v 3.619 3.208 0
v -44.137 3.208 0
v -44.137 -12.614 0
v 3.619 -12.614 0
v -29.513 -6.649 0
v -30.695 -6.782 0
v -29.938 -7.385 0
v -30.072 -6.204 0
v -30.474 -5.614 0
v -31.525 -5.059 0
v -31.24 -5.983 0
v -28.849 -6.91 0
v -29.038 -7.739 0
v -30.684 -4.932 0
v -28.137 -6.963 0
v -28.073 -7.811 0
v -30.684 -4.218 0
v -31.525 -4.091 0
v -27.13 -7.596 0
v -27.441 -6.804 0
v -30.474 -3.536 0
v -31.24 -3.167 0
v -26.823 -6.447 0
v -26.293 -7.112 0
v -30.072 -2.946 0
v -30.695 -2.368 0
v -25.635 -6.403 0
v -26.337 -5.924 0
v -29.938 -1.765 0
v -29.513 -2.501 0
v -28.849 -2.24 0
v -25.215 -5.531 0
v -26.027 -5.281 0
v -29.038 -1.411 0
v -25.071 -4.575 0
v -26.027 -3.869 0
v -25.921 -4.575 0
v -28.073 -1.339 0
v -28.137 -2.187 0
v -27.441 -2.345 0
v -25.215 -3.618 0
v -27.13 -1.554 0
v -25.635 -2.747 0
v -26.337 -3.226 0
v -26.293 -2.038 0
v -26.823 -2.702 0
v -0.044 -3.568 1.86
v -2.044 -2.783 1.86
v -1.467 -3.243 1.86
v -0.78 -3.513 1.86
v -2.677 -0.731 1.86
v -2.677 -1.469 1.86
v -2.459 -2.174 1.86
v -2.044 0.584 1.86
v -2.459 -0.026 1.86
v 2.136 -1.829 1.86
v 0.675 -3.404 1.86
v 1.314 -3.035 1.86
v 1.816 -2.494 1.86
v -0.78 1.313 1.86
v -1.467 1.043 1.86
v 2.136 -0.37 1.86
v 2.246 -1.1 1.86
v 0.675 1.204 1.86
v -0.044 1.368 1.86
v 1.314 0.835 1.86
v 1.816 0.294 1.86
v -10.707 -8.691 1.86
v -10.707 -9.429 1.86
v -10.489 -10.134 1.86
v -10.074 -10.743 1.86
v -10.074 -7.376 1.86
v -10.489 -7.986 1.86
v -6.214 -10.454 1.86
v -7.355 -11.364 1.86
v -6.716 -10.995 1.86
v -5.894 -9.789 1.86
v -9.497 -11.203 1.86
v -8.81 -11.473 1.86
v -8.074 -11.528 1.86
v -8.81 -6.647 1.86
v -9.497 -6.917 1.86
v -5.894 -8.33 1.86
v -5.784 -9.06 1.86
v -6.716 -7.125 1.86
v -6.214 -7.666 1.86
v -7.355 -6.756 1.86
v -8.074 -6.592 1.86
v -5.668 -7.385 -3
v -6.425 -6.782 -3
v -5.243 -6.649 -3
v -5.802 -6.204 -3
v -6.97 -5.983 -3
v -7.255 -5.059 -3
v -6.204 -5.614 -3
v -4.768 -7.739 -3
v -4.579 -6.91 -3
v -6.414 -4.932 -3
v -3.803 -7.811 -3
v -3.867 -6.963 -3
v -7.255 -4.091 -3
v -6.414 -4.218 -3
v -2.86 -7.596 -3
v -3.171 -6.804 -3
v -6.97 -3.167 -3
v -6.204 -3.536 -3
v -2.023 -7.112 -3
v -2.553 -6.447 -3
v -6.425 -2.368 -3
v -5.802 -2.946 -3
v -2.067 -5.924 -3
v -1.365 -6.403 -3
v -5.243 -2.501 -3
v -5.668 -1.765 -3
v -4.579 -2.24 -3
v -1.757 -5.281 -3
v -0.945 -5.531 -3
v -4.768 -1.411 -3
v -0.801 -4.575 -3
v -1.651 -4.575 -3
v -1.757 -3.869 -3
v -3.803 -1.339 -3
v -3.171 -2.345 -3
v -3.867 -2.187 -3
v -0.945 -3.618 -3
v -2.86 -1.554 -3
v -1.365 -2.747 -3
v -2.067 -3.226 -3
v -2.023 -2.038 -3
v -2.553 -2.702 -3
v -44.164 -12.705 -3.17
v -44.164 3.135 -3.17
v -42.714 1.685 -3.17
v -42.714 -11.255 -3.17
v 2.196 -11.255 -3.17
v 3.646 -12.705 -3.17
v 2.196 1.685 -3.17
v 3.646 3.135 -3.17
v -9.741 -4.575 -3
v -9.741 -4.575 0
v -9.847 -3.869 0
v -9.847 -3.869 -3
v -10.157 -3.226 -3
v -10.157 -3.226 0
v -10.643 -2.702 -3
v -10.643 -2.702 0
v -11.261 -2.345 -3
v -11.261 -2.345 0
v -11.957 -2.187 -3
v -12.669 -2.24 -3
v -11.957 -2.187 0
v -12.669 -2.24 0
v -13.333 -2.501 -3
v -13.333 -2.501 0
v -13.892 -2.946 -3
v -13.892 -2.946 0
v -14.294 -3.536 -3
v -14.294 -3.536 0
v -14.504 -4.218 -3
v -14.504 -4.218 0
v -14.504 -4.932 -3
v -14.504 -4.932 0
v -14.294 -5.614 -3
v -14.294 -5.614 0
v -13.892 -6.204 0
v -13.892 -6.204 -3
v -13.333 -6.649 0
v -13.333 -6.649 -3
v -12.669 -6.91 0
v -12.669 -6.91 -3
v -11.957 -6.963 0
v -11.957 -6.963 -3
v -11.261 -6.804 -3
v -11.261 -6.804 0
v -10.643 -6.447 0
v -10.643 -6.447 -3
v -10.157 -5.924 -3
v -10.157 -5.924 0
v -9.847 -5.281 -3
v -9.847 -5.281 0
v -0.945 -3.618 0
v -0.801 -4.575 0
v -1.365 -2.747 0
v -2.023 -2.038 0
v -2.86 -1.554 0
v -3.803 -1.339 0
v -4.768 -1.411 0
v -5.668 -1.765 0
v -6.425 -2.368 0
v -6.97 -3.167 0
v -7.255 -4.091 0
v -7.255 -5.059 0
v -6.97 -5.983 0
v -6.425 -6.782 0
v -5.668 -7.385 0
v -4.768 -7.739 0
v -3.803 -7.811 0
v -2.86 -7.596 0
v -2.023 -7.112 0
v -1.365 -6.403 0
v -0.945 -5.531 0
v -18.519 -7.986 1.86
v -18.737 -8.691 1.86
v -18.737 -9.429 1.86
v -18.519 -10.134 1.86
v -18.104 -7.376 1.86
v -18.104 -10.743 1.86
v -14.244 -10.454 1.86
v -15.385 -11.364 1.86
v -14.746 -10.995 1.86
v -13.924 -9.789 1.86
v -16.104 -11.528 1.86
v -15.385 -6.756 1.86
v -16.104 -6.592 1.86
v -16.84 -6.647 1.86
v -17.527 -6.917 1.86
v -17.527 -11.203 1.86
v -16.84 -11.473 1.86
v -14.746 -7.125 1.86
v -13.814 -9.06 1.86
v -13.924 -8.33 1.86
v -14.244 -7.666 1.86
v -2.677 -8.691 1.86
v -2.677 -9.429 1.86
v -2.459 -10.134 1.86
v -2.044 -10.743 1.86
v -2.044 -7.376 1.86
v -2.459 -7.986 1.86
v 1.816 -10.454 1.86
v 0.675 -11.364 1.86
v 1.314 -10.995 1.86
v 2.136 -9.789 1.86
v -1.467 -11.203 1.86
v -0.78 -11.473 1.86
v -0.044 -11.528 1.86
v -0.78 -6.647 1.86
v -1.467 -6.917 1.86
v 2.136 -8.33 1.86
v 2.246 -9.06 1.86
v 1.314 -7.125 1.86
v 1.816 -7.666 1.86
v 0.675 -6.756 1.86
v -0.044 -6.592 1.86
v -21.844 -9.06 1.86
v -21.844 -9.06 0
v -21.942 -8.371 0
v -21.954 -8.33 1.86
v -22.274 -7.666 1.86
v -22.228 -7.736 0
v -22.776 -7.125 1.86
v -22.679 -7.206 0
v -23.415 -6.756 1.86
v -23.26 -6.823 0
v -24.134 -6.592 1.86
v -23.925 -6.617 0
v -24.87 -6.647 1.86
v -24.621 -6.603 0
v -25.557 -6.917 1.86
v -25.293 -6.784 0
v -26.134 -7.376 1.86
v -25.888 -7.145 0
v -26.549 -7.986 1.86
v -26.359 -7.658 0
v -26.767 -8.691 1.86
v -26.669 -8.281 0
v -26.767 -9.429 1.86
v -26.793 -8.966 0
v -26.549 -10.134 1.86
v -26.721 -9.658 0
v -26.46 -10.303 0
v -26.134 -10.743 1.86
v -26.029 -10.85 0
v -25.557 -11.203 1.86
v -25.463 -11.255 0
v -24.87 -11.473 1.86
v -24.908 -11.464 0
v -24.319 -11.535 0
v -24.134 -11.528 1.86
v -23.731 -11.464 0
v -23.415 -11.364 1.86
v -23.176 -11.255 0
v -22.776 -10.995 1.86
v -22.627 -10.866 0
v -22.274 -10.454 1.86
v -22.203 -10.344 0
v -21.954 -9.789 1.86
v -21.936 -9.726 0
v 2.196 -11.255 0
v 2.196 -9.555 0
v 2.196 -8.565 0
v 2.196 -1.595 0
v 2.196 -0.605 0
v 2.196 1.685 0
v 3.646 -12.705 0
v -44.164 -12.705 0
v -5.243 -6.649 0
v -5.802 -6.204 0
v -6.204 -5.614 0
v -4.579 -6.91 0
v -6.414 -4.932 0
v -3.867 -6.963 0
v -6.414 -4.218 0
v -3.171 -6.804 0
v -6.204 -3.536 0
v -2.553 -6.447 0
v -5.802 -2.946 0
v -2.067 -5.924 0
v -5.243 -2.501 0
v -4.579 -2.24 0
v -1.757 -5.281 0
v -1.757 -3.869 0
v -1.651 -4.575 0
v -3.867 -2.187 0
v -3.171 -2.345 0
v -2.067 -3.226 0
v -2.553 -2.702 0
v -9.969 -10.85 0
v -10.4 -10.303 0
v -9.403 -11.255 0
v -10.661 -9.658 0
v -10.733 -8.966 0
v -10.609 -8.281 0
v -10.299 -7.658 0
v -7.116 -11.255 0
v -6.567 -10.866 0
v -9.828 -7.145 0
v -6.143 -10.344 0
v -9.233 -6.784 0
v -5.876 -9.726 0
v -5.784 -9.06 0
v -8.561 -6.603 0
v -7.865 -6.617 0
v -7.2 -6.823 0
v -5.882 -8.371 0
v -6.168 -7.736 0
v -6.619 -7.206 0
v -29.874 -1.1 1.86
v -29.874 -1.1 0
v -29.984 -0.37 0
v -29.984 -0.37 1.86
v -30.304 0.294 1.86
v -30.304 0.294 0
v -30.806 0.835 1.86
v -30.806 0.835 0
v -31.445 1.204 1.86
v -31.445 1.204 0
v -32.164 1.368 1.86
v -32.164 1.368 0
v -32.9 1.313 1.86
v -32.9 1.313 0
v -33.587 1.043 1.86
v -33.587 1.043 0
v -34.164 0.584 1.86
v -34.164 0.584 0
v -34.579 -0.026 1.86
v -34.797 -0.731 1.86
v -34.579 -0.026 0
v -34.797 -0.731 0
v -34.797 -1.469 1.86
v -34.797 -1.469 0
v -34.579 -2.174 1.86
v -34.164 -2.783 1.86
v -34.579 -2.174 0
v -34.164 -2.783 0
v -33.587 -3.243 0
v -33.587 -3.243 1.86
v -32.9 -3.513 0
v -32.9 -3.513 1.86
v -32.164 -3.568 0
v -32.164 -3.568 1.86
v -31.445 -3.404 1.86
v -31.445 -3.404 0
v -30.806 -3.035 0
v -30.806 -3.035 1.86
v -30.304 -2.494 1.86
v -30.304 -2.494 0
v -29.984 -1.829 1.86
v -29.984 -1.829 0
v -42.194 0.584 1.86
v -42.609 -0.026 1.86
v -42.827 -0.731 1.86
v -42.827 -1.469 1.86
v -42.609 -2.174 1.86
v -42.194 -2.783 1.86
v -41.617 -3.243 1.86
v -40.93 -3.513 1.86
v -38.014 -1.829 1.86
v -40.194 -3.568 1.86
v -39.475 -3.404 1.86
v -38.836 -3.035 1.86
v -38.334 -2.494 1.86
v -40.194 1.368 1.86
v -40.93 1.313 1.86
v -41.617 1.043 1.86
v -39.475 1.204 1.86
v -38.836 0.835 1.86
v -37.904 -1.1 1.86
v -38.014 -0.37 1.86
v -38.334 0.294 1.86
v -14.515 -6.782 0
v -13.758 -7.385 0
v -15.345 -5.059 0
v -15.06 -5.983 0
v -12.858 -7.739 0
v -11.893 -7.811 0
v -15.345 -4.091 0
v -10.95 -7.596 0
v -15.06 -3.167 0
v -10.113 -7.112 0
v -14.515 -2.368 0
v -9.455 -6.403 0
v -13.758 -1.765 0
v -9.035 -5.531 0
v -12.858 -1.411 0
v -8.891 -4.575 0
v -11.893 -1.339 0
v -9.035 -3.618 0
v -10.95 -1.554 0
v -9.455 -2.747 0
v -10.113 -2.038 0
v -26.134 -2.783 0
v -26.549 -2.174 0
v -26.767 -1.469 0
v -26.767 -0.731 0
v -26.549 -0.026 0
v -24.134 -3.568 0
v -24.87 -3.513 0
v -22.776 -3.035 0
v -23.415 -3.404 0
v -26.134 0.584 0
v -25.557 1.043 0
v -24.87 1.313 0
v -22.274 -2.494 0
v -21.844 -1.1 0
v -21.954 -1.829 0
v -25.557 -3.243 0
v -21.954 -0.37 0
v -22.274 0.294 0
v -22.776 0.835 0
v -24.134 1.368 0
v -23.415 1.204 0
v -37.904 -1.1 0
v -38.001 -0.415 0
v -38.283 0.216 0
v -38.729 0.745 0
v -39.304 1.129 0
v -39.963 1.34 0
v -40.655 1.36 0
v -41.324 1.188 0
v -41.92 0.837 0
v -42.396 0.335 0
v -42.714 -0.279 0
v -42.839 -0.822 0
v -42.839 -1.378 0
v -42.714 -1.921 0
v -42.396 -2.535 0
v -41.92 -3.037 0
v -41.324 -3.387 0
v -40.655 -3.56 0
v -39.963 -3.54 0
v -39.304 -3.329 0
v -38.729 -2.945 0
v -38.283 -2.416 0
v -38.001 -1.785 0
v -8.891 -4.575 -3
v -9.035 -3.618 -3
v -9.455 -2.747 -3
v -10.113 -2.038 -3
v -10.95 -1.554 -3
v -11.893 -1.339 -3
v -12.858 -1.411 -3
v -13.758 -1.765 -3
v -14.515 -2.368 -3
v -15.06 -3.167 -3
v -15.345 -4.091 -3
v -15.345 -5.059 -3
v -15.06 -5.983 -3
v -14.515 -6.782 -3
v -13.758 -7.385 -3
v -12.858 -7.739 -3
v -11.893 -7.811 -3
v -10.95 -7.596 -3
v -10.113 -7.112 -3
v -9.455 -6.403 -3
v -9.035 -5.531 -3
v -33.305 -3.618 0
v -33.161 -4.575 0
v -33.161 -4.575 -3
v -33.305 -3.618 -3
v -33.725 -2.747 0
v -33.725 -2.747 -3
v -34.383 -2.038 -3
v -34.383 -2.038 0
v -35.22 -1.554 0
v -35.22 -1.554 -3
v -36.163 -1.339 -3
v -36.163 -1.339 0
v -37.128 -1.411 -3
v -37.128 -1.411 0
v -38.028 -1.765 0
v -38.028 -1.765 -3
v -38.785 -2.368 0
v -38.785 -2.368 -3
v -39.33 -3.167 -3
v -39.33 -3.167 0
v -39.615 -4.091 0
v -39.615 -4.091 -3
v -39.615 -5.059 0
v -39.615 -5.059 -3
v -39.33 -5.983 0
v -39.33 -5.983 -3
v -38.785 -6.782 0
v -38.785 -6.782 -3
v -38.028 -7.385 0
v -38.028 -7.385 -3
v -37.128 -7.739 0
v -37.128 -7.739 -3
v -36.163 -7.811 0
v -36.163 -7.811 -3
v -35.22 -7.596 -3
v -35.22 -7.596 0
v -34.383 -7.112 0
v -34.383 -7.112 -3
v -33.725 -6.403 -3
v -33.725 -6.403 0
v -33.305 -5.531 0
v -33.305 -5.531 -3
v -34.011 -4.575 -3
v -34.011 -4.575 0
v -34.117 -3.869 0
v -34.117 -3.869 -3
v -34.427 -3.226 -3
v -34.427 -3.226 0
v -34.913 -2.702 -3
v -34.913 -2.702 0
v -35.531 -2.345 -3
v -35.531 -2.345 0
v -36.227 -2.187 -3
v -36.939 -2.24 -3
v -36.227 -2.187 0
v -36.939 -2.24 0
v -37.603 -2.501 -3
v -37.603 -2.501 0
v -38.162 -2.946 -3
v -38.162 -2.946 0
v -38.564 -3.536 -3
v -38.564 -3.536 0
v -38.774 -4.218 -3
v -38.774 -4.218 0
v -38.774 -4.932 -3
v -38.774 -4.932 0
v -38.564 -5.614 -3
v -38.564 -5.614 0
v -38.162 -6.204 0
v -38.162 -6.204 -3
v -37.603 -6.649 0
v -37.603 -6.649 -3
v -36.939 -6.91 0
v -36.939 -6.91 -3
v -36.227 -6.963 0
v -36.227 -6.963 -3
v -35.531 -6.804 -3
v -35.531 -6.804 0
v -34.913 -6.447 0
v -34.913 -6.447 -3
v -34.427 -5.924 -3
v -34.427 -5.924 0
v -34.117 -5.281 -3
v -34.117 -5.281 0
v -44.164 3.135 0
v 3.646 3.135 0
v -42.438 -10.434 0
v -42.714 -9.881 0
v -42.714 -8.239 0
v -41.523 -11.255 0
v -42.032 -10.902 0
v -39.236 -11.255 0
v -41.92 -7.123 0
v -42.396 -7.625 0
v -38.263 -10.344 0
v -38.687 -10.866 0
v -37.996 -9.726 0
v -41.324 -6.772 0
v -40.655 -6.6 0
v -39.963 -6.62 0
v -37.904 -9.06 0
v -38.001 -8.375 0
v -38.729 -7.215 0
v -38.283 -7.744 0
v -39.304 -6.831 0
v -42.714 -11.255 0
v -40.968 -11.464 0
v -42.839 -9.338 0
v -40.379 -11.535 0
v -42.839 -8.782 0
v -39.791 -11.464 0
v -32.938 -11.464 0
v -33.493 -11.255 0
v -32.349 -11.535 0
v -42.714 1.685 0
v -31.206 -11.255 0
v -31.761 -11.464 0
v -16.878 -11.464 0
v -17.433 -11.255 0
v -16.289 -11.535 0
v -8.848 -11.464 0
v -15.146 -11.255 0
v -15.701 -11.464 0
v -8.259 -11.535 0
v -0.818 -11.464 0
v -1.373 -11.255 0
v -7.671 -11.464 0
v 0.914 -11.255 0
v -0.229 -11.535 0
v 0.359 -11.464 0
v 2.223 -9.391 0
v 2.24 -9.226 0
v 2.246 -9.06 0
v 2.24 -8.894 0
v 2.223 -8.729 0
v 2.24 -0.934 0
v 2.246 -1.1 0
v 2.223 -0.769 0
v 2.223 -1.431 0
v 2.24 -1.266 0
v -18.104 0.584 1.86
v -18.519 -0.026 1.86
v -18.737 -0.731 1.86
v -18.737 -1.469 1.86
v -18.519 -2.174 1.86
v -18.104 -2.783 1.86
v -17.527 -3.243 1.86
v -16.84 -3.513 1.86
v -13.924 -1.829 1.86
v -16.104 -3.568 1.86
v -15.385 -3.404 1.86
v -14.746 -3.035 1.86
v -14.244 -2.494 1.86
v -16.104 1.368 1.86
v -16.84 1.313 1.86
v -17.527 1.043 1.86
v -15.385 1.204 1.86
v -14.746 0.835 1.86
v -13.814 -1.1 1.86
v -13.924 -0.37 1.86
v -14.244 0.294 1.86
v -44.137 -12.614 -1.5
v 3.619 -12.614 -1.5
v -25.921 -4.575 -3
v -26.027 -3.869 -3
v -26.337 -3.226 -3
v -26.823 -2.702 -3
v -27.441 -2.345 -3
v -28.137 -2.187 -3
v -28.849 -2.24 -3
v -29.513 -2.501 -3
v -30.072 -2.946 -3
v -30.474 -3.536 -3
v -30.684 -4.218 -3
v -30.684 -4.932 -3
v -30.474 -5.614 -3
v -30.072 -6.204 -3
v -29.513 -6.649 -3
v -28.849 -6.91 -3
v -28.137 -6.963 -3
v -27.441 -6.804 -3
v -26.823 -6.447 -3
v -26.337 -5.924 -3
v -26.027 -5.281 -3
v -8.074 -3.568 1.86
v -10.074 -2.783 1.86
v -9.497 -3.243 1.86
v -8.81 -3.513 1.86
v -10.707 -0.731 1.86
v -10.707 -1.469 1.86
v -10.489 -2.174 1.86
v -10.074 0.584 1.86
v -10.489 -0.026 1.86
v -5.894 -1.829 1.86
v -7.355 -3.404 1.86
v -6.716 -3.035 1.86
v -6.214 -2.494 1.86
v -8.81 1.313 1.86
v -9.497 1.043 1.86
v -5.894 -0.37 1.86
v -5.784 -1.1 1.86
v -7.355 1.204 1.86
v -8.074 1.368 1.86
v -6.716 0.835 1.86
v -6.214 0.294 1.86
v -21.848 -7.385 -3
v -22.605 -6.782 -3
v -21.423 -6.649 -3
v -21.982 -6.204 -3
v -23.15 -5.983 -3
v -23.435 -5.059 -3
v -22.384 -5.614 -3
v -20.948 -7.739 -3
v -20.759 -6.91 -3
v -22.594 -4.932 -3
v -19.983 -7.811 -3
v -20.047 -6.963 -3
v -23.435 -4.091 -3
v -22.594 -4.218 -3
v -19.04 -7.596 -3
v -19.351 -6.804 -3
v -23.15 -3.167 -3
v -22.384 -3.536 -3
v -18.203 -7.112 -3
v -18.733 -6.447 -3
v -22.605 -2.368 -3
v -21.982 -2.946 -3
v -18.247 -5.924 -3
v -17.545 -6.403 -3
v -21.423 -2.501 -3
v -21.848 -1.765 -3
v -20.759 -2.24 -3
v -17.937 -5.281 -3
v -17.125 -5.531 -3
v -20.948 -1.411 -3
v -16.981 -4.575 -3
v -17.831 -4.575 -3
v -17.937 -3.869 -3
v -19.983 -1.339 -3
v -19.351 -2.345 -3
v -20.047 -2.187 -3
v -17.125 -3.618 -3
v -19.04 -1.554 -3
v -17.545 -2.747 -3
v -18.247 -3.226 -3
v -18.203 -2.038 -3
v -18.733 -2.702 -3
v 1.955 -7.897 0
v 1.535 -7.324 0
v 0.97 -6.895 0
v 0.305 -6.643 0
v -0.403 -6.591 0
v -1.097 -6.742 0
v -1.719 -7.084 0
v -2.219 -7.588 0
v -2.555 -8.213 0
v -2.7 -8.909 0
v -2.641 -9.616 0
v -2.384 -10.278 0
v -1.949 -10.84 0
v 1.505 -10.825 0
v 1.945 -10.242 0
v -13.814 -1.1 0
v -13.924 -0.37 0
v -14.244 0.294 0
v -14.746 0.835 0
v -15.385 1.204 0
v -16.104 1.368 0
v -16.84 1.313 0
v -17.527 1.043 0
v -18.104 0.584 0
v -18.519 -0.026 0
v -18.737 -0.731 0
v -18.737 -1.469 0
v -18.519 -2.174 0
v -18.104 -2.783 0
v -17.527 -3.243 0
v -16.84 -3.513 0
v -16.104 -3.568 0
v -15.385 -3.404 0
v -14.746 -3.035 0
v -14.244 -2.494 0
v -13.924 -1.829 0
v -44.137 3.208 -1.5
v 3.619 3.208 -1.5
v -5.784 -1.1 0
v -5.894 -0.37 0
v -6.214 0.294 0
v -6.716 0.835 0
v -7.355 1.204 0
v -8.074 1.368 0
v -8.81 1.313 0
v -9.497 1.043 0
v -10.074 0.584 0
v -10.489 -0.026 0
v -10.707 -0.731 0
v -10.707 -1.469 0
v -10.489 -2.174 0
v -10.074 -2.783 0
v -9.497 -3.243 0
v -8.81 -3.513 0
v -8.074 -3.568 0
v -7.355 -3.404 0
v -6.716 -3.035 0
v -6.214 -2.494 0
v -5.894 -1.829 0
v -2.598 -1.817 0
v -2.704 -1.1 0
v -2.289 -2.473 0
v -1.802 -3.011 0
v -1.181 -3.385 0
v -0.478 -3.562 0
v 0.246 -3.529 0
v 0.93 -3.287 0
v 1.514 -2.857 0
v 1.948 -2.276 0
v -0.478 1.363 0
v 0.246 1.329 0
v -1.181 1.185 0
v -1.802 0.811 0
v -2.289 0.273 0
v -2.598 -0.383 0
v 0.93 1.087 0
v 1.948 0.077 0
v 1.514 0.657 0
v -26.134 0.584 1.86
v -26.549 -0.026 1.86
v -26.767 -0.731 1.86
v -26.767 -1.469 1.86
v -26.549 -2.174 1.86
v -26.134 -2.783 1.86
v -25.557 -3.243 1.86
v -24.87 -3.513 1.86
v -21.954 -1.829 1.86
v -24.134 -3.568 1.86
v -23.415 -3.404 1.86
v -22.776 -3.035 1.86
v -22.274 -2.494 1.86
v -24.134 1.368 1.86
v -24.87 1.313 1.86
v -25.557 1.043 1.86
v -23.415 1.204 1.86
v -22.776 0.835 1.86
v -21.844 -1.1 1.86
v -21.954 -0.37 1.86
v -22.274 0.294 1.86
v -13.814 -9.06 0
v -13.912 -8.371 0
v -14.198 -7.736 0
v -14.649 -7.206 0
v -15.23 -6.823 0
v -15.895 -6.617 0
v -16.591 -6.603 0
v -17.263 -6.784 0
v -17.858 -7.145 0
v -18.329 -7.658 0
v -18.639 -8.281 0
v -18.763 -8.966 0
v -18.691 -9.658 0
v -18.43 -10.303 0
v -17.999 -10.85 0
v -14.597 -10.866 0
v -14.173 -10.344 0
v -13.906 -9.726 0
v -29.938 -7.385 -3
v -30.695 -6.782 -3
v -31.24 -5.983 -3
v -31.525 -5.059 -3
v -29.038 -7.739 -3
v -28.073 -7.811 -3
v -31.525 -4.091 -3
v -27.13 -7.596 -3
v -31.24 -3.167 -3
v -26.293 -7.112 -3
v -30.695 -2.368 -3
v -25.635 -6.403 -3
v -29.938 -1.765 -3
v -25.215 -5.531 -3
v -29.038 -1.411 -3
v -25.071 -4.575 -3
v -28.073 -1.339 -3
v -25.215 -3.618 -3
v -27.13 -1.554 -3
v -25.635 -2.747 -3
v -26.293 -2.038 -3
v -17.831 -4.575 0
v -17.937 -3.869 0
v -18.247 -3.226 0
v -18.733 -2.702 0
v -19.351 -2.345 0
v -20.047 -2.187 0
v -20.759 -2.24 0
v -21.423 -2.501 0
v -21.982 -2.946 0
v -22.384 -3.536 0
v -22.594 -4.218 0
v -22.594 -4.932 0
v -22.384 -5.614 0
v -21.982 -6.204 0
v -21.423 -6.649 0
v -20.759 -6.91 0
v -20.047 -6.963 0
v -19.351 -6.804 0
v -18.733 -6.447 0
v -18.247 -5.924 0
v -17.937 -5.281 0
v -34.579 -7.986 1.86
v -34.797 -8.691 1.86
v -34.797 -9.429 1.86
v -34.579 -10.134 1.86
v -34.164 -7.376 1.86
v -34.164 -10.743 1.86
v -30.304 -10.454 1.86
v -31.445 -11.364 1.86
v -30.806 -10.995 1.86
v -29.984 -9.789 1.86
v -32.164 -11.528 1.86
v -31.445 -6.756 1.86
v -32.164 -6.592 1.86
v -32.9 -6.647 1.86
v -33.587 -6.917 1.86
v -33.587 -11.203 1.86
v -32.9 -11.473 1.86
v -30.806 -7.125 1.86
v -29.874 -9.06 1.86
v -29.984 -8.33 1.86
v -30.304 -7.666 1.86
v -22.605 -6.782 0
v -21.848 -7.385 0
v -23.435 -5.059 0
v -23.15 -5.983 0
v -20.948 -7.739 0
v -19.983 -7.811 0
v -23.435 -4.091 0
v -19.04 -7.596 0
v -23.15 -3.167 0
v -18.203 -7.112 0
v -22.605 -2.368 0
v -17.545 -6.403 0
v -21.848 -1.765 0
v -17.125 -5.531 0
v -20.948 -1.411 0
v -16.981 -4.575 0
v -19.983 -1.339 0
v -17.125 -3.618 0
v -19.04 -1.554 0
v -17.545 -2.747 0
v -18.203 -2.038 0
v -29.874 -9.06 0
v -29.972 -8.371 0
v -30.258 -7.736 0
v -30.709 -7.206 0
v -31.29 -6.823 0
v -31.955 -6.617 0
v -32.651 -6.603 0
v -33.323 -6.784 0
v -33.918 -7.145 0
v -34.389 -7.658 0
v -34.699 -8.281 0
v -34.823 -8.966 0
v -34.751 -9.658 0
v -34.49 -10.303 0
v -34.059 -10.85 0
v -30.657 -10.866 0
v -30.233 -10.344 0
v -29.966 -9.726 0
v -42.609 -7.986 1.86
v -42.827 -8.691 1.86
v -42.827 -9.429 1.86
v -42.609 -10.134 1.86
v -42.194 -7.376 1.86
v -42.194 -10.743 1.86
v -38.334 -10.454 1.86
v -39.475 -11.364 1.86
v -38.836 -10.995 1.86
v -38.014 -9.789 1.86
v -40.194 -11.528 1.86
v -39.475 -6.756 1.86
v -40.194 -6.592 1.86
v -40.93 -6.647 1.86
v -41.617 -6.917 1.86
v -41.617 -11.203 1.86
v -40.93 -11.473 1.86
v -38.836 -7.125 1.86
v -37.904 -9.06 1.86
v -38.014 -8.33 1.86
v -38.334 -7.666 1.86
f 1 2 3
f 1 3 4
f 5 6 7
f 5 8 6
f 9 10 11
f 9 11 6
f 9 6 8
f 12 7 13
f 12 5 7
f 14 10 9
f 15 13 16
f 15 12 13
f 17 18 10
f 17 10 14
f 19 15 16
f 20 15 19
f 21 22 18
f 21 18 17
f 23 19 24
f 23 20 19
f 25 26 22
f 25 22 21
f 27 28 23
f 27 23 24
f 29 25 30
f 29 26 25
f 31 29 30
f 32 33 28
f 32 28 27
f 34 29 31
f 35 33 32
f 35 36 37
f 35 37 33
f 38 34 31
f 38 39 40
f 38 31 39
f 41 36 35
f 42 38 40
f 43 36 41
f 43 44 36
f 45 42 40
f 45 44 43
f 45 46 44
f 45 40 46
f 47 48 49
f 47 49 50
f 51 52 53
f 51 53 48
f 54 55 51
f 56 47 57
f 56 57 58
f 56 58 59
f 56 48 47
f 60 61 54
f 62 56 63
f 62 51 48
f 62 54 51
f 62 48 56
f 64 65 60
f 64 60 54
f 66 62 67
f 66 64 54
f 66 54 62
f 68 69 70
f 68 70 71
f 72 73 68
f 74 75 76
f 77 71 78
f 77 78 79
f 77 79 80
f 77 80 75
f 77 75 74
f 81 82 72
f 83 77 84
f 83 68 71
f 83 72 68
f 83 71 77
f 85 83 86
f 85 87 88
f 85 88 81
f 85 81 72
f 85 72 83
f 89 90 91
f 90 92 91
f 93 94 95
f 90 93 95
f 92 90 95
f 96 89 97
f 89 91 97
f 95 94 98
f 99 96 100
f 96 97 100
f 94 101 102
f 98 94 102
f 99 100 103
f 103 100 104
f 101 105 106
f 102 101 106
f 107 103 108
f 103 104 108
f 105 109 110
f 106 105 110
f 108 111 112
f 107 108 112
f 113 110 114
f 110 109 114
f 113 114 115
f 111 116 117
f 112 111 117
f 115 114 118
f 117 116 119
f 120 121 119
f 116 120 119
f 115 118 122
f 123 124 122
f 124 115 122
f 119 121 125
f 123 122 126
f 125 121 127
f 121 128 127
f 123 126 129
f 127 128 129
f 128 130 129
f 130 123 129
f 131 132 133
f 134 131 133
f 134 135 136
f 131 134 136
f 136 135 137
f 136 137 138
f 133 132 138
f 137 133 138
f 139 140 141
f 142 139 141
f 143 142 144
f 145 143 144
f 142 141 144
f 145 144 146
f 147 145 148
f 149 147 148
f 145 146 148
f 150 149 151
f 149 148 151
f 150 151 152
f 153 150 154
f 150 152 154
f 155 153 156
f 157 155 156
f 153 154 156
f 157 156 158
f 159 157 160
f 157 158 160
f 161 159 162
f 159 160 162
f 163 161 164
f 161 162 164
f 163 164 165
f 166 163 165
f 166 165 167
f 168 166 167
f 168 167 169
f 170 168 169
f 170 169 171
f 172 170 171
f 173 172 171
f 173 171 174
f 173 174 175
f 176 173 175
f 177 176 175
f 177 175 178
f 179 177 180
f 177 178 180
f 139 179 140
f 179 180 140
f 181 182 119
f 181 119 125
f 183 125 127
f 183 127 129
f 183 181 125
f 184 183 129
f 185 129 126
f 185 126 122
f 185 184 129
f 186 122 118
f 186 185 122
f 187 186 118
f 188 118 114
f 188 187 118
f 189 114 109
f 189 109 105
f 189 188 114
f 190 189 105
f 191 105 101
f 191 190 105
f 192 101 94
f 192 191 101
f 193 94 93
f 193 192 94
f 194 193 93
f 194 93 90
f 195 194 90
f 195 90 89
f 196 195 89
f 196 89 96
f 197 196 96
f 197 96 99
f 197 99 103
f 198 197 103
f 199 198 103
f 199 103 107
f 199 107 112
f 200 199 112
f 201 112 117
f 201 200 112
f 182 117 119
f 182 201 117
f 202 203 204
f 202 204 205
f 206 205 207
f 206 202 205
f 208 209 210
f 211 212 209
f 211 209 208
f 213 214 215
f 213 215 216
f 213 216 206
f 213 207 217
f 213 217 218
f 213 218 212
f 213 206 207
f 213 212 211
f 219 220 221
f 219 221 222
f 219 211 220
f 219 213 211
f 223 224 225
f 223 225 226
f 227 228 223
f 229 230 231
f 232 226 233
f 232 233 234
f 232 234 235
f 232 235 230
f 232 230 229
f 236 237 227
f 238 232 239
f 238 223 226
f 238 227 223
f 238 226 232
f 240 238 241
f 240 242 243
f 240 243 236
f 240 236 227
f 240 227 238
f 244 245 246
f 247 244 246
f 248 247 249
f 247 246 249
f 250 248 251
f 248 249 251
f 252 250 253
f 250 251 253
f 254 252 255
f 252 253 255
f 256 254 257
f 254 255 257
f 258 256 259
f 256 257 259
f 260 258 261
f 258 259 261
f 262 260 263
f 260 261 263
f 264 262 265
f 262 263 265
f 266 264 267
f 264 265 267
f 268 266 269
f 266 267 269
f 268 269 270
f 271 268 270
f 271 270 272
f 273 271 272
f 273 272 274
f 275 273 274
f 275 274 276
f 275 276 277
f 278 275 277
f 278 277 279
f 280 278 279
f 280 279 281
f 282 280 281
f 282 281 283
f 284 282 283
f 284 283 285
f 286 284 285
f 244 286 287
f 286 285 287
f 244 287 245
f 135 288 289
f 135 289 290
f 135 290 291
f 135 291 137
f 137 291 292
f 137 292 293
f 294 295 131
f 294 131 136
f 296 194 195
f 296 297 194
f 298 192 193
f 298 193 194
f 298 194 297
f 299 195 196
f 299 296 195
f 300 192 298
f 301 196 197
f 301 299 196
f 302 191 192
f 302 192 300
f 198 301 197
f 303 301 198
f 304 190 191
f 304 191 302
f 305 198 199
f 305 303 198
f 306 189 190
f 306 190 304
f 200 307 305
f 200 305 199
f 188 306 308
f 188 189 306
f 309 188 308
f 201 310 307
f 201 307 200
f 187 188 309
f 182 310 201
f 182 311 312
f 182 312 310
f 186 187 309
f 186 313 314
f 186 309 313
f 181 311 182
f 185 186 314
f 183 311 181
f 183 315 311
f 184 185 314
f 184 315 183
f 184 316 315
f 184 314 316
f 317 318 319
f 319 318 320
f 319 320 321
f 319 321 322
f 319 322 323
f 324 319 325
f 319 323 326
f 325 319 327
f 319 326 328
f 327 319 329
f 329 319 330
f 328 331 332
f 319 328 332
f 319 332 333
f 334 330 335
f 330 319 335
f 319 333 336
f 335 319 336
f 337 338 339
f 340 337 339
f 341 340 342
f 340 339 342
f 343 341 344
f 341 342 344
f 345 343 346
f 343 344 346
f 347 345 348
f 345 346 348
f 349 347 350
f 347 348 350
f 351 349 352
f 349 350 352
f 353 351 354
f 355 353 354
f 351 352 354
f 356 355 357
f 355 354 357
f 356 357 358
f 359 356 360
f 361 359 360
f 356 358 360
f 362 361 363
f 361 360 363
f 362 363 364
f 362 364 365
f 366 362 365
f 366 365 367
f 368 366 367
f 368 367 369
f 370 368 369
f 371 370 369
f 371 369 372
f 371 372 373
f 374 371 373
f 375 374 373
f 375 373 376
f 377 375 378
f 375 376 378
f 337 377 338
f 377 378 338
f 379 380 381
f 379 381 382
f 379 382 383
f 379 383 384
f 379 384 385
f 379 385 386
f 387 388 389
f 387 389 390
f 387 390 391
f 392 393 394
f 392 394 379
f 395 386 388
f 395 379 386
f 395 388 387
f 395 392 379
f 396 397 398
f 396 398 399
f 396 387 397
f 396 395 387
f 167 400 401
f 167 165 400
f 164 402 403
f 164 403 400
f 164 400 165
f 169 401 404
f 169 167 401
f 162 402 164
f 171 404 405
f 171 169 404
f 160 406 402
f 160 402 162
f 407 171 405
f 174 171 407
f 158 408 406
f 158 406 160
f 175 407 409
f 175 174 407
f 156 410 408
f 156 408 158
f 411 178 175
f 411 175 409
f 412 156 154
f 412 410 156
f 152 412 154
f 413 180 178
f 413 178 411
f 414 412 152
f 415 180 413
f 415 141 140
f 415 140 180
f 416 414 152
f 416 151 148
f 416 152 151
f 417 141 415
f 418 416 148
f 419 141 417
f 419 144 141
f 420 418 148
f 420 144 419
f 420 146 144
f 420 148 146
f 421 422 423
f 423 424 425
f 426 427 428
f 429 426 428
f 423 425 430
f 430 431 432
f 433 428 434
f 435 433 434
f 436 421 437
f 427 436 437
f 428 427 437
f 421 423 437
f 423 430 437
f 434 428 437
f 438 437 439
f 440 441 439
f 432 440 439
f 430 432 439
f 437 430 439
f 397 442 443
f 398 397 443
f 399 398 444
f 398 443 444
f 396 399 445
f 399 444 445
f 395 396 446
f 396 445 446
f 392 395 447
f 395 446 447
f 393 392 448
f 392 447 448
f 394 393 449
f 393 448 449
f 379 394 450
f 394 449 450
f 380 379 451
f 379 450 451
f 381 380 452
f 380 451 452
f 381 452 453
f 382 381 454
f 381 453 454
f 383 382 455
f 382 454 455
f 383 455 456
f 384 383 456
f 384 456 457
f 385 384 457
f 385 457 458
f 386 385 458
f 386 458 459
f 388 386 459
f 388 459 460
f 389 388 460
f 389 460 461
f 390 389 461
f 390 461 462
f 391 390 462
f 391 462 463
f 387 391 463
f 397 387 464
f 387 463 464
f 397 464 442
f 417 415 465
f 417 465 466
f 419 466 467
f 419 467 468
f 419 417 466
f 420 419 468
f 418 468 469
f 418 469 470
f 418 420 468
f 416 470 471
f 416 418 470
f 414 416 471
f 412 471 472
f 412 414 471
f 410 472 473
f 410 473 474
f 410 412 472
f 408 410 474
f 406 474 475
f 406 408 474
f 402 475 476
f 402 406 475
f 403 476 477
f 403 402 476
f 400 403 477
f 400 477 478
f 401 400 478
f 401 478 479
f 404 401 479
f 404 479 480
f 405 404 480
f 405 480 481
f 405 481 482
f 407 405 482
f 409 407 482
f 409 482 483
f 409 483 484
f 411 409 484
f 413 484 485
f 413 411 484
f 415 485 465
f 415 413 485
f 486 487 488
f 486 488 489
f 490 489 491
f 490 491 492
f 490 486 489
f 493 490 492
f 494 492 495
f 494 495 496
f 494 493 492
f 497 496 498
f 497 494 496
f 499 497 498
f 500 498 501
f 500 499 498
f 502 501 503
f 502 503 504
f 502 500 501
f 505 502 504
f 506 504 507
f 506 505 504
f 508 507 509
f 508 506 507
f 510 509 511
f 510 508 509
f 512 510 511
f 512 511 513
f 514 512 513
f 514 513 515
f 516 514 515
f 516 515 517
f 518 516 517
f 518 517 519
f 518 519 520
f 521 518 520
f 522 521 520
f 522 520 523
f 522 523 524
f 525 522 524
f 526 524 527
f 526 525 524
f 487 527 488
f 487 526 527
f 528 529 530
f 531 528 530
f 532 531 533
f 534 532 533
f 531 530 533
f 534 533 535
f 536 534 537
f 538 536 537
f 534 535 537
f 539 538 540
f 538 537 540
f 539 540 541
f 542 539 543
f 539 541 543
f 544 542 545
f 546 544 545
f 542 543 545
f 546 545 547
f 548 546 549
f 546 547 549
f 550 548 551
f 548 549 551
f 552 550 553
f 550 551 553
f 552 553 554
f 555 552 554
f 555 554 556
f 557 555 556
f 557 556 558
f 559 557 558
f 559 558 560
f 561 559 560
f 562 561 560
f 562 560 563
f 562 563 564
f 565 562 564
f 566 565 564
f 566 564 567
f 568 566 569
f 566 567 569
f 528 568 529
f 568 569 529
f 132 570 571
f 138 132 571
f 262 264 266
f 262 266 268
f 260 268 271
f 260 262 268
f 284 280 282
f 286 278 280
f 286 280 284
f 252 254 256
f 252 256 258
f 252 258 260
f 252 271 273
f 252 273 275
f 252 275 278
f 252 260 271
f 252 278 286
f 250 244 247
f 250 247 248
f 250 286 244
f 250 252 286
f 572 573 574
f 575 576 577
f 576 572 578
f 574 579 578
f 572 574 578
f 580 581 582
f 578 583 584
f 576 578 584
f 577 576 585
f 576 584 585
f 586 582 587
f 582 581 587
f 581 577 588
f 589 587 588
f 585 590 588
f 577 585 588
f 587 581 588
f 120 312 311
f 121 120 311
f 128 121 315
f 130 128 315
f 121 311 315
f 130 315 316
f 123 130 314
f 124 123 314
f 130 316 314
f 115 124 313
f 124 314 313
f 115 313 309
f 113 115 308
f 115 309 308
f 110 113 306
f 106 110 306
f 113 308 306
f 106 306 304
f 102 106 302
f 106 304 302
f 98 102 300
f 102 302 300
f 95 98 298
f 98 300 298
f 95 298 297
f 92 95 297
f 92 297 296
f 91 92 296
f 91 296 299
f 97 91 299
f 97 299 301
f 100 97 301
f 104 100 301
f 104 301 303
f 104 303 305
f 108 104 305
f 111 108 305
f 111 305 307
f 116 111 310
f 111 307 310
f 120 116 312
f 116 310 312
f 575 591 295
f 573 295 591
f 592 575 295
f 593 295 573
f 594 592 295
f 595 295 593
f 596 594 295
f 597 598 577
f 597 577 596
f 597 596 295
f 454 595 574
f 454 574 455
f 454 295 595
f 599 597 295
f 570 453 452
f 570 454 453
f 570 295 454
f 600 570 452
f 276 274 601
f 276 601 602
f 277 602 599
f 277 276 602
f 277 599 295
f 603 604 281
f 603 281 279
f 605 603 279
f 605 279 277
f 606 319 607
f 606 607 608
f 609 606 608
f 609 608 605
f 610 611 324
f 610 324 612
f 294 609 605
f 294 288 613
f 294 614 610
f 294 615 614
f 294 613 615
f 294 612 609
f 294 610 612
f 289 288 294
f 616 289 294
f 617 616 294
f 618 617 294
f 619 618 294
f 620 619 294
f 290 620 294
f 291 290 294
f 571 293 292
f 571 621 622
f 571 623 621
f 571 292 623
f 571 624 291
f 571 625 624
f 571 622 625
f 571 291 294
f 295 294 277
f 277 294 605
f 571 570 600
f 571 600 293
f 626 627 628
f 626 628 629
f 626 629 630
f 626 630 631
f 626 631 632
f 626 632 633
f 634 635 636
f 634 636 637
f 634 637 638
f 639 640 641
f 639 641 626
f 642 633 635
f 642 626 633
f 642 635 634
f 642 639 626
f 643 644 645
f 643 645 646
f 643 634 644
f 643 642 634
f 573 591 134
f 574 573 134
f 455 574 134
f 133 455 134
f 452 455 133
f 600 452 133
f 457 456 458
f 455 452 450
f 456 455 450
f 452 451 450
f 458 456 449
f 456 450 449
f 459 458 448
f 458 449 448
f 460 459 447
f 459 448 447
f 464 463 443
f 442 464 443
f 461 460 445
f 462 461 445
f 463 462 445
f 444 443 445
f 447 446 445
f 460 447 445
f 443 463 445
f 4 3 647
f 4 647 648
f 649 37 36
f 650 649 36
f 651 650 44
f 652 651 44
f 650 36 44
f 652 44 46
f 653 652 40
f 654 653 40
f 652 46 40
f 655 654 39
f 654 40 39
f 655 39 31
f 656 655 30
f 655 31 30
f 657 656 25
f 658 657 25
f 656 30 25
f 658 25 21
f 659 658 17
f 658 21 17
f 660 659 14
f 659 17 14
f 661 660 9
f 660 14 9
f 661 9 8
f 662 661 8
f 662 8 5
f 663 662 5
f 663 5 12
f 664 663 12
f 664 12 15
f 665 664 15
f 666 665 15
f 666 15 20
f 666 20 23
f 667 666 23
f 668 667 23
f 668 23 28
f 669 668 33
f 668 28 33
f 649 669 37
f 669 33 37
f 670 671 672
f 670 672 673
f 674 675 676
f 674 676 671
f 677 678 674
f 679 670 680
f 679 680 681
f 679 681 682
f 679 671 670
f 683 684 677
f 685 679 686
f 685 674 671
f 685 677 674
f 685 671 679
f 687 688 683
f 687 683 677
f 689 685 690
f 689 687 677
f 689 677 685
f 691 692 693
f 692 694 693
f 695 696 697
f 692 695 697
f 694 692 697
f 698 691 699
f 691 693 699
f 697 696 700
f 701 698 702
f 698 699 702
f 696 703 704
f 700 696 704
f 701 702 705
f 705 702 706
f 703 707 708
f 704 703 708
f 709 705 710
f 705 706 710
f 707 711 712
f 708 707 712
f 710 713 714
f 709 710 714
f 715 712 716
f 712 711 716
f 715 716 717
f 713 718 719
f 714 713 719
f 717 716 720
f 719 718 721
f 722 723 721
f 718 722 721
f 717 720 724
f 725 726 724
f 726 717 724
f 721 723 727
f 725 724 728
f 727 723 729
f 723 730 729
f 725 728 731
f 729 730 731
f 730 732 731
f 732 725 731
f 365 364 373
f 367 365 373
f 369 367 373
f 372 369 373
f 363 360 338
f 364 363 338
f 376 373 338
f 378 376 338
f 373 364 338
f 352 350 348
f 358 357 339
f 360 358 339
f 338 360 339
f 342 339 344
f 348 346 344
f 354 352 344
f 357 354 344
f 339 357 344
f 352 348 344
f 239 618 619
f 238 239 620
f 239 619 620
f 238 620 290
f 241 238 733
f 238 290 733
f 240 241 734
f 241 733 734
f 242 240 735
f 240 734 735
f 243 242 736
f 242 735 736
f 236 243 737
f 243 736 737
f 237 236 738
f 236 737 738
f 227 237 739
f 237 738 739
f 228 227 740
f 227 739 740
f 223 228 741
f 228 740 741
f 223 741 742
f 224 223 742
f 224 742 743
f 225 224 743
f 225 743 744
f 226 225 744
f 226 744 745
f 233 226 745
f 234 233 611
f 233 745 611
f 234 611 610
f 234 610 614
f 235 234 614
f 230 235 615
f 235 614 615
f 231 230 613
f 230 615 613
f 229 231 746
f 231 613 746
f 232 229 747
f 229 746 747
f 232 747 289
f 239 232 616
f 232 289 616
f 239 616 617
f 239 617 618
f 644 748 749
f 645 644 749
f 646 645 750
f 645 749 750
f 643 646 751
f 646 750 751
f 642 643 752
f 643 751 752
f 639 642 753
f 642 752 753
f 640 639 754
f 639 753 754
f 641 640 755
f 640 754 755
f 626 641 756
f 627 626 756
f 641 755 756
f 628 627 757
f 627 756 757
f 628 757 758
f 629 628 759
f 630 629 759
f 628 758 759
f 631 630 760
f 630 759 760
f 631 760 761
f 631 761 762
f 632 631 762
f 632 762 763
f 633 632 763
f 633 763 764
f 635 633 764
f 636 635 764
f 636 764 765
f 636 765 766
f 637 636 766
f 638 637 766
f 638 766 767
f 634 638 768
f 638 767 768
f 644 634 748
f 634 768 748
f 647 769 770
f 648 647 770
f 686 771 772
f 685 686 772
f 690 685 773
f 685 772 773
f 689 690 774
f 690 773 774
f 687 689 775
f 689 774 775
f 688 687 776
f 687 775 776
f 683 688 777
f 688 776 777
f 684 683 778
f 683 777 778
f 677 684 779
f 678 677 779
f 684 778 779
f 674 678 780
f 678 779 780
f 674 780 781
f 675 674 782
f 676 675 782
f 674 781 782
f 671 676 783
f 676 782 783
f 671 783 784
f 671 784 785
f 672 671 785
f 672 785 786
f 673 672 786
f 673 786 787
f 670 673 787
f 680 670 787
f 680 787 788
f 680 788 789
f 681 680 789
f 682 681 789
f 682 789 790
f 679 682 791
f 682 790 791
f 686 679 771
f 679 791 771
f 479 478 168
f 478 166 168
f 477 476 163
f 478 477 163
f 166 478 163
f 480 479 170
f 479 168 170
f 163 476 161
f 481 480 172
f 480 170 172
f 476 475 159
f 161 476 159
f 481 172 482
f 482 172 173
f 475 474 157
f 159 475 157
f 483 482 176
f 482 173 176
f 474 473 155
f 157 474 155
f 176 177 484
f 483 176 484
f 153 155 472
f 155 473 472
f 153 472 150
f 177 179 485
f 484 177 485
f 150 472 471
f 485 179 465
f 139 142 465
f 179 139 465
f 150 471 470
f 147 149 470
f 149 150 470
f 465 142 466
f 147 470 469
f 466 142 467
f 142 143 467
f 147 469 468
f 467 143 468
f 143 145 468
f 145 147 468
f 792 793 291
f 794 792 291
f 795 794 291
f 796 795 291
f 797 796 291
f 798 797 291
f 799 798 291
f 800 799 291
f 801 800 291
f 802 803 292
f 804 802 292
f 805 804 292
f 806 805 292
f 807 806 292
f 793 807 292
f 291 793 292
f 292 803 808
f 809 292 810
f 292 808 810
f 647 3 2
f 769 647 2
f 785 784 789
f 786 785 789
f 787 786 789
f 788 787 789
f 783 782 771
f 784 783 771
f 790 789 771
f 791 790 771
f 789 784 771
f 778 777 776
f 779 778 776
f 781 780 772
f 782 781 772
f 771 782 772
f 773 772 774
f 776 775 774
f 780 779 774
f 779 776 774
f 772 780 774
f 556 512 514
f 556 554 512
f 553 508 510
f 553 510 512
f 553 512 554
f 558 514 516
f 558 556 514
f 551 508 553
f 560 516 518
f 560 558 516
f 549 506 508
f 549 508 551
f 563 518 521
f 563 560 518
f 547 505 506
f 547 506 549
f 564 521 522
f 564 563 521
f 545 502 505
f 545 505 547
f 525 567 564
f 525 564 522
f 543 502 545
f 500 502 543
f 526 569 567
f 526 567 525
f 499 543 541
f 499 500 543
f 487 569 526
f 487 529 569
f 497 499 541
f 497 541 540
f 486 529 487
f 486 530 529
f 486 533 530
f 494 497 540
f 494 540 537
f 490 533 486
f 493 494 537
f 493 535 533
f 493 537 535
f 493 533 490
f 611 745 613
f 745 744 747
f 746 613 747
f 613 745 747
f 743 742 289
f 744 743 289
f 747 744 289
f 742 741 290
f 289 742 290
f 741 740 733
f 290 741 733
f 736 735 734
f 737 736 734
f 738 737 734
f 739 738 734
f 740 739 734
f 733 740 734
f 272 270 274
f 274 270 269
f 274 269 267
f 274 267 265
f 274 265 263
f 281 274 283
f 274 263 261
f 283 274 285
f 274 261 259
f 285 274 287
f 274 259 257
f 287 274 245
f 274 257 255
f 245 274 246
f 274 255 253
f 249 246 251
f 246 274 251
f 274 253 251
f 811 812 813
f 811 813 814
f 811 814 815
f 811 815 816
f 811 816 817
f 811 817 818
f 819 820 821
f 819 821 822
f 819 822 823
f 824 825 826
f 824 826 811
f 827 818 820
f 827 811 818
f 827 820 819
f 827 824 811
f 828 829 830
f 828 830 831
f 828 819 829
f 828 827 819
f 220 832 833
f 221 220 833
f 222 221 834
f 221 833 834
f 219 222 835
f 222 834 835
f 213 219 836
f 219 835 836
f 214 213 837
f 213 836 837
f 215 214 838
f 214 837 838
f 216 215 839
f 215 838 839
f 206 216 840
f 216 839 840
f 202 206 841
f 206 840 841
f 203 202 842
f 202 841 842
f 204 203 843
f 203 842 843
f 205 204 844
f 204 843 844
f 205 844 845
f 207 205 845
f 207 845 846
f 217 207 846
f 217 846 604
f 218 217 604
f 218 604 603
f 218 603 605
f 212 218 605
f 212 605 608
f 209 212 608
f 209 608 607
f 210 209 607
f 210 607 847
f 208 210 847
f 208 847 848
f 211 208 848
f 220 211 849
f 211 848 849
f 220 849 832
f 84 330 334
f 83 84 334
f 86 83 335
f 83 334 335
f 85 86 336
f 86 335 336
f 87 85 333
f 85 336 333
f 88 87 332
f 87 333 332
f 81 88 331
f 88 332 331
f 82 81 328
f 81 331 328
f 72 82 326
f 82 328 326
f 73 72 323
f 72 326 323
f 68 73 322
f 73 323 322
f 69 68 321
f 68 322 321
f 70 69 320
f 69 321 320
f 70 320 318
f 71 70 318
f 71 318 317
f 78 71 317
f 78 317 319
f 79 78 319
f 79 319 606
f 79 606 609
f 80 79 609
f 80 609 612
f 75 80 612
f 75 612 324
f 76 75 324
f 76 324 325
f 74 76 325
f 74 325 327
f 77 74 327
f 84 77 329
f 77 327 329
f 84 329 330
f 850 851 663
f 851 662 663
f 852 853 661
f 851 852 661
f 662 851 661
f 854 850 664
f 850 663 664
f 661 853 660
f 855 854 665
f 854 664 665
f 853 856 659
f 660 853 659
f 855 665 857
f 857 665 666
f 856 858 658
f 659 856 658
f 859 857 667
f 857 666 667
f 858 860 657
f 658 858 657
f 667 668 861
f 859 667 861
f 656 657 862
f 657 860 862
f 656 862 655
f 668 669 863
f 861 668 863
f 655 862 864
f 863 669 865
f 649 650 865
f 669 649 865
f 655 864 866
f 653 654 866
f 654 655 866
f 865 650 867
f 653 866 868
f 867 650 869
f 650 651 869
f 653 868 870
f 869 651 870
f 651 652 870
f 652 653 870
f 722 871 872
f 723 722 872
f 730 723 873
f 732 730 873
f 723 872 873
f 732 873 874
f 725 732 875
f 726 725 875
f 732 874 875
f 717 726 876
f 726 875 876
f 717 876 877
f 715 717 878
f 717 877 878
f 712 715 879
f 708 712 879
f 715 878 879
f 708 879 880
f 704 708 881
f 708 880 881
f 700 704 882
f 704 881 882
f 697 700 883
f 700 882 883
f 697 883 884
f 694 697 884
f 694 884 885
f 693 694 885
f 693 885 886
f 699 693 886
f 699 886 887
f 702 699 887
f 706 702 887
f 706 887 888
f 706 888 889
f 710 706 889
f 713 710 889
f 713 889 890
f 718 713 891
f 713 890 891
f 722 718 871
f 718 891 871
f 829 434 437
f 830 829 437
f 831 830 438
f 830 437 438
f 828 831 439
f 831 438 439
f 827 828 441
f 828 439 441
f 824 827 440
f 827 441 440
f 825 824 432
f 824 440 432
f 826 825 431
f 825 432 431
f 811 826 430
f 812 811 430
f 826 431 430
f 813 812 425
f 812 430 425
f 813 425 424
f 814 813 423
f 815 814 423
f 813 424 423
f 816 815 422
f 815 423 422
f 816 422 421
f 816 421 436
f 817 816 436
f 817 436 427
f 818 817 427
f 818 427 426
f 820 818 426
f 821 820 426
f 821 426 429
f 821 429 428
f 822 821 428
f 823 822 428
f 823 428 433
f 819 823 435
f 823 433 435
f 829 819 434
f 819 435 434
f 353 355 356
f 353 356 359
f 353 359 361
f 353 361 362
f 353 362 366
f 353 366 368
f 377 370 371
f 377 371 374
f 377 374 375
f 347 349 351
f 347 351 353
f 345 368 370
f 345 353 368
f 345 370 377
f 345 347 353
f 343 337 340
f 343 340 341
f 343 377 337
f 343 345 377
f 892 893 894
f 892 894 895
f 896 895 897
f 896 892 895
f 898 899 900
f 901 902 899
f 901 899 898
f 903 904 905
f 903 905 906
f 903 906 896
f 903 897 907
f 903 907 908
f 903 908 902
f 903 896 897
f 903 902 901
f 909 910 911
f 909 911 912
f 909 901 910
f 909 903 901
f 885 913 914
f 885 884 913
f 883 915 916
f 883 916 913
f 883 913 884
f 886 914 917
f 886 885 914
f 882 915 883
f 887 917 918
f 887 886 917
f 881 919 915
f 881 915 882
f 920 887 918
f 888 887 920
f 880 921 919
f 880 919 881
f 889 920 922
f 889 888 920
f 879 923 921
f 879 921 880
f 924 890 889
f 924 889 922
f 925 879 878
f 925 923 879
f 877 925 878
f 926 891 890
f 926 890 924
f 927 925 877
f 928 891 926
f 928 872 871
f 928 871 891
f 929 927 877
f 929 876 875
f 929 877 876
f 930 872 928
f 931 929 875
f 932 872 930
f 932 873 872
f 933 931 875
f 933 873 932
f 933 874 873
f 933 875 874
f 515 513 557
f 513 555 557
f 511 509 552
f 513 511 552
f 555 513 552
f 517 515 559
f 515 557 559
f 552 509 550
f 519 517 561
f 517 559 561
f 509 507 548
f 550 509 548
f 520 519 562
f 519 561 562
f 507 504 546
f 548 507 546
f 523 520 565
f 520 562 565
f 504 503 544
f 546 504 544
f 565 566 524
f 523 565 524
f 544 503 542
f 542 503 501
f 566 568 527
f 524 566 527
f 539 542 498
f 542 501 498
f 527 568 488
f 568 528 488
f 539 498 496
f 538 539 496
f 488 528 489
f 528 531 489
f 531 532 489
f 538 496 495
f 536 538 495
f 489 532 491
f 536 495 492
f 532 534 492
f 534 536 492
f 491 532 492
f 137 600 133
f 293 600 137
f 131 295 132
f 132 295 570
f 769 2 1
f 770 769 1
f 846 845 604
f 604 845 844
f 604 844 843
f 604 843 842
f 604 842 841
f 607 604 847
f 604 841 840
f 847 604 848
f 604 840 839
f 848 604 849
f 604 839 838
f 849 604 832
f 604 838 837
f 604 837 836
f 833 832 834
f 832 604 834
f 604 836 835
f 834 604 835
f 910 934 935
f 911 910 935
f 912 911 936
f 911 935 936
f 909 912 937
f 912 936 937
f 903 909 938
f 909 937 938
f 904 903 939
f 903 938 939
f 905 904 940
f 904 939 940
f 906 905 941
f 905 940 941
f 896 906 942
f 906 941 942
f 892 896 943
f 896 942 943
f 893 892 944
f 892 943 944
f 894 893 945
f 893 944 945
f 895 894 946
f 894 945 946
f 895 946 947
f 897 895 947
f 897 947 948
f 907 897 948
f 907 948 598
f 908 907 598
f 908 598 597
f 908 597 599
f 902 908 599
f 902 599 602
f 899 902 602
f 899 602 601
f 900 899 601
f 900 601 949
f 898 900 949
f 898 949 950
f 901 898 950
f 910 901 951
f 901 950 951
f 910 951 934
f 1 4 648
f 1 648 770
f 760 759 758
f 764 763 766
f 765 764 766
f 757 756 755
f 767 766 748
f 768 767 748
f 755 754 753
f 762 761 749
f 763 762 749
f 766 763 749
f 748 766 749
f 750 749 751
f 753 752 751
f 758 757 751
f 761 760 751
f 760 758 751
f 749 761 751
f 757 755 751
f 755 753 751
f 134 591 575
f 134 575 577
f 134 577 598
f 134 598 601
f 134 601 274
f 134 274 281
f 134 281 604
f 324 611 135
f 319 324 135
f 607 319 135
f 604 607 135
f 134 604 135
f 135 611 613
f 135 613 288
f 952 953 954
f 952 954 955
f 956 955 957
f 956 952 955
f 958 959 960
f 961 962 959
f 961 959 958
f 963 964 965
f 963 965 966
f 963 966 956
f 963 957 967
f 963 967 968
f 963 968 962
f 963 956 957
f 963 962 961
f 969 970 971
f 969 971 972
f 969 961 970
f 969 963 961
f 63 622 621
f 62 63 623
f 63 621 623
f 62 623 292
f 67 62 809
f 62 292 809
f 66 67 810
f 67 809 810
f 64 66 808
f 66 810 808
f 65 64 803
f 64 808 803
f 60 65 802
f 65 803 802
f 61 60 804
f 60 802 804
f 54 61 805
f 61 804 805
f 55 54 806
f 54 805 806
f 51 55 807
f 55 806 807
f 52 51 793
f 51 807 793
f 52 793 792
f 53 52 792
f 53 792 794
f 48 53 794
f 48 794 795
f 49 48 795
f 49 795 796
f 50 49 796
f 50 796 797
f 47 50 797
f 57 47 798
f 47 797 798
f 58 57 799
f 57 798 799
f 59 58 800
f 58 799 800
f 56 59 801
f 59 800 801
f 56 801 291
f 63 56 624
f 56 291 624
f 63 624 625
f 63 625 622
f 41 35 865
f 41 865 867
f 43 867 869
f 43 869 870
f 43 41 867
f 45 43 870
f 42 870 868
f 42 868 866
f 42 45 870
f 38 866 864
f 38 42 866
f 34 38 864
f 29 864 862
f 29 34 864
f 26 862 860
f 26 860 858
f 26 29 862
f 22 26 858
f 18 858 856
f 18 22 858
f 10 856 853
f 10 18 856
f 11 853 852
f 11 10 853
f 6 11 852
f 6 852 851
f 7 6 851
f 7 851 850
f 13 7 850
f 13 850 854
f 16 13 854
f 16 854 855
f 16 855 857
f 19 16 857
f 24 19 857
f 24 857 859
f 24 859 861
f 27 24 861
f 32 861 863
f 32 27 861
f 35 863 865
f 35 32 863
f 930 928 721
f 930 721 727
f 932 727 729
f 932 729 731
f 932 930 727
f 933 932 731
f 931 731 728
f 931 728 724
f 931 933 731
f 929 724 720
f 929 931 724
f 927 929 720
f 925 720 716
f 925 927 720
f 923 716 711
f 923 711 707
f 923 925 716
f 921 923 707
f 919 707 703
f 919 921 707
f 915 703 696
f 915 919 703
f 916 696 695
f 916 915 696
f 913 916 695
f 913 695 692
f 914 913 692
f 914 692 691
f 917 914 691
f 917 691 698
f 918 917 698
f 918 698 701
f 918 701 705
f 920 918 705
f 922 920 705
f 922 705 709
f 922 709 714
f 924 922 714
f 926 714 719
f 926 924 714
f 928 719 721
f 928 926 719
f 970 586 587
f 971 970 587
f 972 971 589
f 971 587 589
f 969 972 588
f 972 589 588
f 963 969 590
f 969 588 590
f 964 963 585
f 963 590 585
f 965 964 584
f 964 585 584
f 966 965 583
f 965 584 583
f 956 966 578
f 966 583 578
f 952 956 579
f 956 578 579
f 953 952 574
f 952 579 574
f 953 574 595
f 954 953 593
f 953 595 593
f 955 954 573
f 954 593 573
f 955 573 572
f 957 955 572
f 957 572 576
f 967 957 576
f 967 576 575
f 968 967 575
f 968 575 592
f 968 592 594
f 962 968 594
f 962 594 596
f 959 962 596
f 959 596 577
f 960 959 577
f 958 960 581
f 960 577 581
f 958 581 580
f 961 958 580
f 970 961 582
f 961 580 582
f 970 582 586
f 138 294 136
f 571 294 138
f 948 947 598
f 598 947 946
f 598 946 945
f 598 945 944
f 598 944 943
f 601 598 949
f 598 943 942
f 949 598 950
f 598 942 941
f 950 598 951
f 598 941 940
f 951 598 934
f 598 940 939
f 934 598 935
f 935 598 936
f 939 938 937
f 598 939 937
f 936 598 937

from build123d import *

# Parameters (mm, degrees)
F0_W     = 47.81
F0_H     = 15.84
F1_DEPTH = 3.17
F2_R     = 2.475
F3_DEPTH = 1.86
F4_W     = 44.91
F4_H     = 12.94
F5_DEPTH = 25
F6_W     = 47.755738
F6_H     = 15.822249
F7_DEPTH = 1.5
F8_R     = 3.245
F8_R_2   = 2.395
F9_DEPTH = 3


with BuildPart() as f1:
    # F0 (on Top) → F1 (new body)
    with BuildSketch(Plane.XY):
        with Locations((-20.259412, -4.784918)):
            Rectangle(F0_W, F0_H)
    extrude(amount=-F1_DEPTH)

    # F2 (on Top) → F3 (join)
    with BuildSketch(Plane.XY):
        with Locations((-40.379412, -1.099918)):
            Circle(F2_R)
        with Locations((-32.349412, -1.099918)):
            Circle(F2_R)
        with Locations((-24.319412, -1.099918)):
            Circle(F2_R)
        with Locations((-16.289412, -1.099918)):
            Circle(F2_R)
        with Locations((-8.259412, -1.099918)):
            Circle(F2_R)
        with Locations((-0.229412, -1.099918)):
            Circle(F2_R)
        with Locations((-40.379412, -9.059918)):
            Circle(F2_R)
        with Locations((-32.349412, -9.059918)):
            Circle(F2_R)
        with Locations((-24.319412, -9.059918)):
            Circle(F2_R)
        with Locations((-16.289412, -9.059918)):
            Circle(F2_R)
        with Locations((-8.259412, -9.059918)):
            Circle(F2_R)
        with Locations((-0.229412, -9.059918)):
            Circle(F2_R)
    extrude(amount=F3_DEPTH)

    # F4 (on Top) → F5 (cut)
    with BuildSketch(Plane.XY):
        with Locations((-20.259412, -4.784918)):
            Rectangle(F4_W, F4_H)
    extrude(amount=-F5_DEPTH, mode=Mode.SUBTRACT)


with BuildPart() as f7:
    # F6 (on Top) → F7 (new body)
    with BuildSketch(Plane.XY):
        with Locations((-20.258886, -4.702678)):
            Rectangle(F6_W, F6_H)
    extrude(amount=-F7_DEPTH)


with BuildPart() as f9:
    # F8 (on Top) → F9 (new body)
    with BuildSketch(Plane.XY):
        with Locations((-36.405881, -4.574933)):
            Circle(F8_R)
        with Locations((-36.405881, -4.574933)):
            Circle(F8_R_2, mode=Mode.SUBTRACT)
        with Locations((-28.315881, -4.574933)):
            Circle(F8_R)
        with Locations((-28.315881, -4.574933)):
            Circle(F8_R_2, mode=Mode.SUBTRACT)
        with Locations((-20.225881, -4.574933)):
            Circle(F8_R)
        with Locations((-20.225881, -4.574933)):
            Circle(F8_R_2, mode=Mode.SUBTRACT)
        with Locations((-12.135881, -4.574933)):
            Circle(F8_R)
        with Locations((-12.135881, -4.574933)):
            Circle(F8_R_2, mode=Mode.SUBTRACT)
        with Locations((-4.045881, -4.574933)):
            Circle(F8_R)
        with Locations((-4.045881, -4.574933)):
            Circle(F8_R_2, mode=Mode.SUBTRACT)
    extrude(amount=-F9_DEPTH)


solid = Compound([f1.part, f7.part, f9.part])
